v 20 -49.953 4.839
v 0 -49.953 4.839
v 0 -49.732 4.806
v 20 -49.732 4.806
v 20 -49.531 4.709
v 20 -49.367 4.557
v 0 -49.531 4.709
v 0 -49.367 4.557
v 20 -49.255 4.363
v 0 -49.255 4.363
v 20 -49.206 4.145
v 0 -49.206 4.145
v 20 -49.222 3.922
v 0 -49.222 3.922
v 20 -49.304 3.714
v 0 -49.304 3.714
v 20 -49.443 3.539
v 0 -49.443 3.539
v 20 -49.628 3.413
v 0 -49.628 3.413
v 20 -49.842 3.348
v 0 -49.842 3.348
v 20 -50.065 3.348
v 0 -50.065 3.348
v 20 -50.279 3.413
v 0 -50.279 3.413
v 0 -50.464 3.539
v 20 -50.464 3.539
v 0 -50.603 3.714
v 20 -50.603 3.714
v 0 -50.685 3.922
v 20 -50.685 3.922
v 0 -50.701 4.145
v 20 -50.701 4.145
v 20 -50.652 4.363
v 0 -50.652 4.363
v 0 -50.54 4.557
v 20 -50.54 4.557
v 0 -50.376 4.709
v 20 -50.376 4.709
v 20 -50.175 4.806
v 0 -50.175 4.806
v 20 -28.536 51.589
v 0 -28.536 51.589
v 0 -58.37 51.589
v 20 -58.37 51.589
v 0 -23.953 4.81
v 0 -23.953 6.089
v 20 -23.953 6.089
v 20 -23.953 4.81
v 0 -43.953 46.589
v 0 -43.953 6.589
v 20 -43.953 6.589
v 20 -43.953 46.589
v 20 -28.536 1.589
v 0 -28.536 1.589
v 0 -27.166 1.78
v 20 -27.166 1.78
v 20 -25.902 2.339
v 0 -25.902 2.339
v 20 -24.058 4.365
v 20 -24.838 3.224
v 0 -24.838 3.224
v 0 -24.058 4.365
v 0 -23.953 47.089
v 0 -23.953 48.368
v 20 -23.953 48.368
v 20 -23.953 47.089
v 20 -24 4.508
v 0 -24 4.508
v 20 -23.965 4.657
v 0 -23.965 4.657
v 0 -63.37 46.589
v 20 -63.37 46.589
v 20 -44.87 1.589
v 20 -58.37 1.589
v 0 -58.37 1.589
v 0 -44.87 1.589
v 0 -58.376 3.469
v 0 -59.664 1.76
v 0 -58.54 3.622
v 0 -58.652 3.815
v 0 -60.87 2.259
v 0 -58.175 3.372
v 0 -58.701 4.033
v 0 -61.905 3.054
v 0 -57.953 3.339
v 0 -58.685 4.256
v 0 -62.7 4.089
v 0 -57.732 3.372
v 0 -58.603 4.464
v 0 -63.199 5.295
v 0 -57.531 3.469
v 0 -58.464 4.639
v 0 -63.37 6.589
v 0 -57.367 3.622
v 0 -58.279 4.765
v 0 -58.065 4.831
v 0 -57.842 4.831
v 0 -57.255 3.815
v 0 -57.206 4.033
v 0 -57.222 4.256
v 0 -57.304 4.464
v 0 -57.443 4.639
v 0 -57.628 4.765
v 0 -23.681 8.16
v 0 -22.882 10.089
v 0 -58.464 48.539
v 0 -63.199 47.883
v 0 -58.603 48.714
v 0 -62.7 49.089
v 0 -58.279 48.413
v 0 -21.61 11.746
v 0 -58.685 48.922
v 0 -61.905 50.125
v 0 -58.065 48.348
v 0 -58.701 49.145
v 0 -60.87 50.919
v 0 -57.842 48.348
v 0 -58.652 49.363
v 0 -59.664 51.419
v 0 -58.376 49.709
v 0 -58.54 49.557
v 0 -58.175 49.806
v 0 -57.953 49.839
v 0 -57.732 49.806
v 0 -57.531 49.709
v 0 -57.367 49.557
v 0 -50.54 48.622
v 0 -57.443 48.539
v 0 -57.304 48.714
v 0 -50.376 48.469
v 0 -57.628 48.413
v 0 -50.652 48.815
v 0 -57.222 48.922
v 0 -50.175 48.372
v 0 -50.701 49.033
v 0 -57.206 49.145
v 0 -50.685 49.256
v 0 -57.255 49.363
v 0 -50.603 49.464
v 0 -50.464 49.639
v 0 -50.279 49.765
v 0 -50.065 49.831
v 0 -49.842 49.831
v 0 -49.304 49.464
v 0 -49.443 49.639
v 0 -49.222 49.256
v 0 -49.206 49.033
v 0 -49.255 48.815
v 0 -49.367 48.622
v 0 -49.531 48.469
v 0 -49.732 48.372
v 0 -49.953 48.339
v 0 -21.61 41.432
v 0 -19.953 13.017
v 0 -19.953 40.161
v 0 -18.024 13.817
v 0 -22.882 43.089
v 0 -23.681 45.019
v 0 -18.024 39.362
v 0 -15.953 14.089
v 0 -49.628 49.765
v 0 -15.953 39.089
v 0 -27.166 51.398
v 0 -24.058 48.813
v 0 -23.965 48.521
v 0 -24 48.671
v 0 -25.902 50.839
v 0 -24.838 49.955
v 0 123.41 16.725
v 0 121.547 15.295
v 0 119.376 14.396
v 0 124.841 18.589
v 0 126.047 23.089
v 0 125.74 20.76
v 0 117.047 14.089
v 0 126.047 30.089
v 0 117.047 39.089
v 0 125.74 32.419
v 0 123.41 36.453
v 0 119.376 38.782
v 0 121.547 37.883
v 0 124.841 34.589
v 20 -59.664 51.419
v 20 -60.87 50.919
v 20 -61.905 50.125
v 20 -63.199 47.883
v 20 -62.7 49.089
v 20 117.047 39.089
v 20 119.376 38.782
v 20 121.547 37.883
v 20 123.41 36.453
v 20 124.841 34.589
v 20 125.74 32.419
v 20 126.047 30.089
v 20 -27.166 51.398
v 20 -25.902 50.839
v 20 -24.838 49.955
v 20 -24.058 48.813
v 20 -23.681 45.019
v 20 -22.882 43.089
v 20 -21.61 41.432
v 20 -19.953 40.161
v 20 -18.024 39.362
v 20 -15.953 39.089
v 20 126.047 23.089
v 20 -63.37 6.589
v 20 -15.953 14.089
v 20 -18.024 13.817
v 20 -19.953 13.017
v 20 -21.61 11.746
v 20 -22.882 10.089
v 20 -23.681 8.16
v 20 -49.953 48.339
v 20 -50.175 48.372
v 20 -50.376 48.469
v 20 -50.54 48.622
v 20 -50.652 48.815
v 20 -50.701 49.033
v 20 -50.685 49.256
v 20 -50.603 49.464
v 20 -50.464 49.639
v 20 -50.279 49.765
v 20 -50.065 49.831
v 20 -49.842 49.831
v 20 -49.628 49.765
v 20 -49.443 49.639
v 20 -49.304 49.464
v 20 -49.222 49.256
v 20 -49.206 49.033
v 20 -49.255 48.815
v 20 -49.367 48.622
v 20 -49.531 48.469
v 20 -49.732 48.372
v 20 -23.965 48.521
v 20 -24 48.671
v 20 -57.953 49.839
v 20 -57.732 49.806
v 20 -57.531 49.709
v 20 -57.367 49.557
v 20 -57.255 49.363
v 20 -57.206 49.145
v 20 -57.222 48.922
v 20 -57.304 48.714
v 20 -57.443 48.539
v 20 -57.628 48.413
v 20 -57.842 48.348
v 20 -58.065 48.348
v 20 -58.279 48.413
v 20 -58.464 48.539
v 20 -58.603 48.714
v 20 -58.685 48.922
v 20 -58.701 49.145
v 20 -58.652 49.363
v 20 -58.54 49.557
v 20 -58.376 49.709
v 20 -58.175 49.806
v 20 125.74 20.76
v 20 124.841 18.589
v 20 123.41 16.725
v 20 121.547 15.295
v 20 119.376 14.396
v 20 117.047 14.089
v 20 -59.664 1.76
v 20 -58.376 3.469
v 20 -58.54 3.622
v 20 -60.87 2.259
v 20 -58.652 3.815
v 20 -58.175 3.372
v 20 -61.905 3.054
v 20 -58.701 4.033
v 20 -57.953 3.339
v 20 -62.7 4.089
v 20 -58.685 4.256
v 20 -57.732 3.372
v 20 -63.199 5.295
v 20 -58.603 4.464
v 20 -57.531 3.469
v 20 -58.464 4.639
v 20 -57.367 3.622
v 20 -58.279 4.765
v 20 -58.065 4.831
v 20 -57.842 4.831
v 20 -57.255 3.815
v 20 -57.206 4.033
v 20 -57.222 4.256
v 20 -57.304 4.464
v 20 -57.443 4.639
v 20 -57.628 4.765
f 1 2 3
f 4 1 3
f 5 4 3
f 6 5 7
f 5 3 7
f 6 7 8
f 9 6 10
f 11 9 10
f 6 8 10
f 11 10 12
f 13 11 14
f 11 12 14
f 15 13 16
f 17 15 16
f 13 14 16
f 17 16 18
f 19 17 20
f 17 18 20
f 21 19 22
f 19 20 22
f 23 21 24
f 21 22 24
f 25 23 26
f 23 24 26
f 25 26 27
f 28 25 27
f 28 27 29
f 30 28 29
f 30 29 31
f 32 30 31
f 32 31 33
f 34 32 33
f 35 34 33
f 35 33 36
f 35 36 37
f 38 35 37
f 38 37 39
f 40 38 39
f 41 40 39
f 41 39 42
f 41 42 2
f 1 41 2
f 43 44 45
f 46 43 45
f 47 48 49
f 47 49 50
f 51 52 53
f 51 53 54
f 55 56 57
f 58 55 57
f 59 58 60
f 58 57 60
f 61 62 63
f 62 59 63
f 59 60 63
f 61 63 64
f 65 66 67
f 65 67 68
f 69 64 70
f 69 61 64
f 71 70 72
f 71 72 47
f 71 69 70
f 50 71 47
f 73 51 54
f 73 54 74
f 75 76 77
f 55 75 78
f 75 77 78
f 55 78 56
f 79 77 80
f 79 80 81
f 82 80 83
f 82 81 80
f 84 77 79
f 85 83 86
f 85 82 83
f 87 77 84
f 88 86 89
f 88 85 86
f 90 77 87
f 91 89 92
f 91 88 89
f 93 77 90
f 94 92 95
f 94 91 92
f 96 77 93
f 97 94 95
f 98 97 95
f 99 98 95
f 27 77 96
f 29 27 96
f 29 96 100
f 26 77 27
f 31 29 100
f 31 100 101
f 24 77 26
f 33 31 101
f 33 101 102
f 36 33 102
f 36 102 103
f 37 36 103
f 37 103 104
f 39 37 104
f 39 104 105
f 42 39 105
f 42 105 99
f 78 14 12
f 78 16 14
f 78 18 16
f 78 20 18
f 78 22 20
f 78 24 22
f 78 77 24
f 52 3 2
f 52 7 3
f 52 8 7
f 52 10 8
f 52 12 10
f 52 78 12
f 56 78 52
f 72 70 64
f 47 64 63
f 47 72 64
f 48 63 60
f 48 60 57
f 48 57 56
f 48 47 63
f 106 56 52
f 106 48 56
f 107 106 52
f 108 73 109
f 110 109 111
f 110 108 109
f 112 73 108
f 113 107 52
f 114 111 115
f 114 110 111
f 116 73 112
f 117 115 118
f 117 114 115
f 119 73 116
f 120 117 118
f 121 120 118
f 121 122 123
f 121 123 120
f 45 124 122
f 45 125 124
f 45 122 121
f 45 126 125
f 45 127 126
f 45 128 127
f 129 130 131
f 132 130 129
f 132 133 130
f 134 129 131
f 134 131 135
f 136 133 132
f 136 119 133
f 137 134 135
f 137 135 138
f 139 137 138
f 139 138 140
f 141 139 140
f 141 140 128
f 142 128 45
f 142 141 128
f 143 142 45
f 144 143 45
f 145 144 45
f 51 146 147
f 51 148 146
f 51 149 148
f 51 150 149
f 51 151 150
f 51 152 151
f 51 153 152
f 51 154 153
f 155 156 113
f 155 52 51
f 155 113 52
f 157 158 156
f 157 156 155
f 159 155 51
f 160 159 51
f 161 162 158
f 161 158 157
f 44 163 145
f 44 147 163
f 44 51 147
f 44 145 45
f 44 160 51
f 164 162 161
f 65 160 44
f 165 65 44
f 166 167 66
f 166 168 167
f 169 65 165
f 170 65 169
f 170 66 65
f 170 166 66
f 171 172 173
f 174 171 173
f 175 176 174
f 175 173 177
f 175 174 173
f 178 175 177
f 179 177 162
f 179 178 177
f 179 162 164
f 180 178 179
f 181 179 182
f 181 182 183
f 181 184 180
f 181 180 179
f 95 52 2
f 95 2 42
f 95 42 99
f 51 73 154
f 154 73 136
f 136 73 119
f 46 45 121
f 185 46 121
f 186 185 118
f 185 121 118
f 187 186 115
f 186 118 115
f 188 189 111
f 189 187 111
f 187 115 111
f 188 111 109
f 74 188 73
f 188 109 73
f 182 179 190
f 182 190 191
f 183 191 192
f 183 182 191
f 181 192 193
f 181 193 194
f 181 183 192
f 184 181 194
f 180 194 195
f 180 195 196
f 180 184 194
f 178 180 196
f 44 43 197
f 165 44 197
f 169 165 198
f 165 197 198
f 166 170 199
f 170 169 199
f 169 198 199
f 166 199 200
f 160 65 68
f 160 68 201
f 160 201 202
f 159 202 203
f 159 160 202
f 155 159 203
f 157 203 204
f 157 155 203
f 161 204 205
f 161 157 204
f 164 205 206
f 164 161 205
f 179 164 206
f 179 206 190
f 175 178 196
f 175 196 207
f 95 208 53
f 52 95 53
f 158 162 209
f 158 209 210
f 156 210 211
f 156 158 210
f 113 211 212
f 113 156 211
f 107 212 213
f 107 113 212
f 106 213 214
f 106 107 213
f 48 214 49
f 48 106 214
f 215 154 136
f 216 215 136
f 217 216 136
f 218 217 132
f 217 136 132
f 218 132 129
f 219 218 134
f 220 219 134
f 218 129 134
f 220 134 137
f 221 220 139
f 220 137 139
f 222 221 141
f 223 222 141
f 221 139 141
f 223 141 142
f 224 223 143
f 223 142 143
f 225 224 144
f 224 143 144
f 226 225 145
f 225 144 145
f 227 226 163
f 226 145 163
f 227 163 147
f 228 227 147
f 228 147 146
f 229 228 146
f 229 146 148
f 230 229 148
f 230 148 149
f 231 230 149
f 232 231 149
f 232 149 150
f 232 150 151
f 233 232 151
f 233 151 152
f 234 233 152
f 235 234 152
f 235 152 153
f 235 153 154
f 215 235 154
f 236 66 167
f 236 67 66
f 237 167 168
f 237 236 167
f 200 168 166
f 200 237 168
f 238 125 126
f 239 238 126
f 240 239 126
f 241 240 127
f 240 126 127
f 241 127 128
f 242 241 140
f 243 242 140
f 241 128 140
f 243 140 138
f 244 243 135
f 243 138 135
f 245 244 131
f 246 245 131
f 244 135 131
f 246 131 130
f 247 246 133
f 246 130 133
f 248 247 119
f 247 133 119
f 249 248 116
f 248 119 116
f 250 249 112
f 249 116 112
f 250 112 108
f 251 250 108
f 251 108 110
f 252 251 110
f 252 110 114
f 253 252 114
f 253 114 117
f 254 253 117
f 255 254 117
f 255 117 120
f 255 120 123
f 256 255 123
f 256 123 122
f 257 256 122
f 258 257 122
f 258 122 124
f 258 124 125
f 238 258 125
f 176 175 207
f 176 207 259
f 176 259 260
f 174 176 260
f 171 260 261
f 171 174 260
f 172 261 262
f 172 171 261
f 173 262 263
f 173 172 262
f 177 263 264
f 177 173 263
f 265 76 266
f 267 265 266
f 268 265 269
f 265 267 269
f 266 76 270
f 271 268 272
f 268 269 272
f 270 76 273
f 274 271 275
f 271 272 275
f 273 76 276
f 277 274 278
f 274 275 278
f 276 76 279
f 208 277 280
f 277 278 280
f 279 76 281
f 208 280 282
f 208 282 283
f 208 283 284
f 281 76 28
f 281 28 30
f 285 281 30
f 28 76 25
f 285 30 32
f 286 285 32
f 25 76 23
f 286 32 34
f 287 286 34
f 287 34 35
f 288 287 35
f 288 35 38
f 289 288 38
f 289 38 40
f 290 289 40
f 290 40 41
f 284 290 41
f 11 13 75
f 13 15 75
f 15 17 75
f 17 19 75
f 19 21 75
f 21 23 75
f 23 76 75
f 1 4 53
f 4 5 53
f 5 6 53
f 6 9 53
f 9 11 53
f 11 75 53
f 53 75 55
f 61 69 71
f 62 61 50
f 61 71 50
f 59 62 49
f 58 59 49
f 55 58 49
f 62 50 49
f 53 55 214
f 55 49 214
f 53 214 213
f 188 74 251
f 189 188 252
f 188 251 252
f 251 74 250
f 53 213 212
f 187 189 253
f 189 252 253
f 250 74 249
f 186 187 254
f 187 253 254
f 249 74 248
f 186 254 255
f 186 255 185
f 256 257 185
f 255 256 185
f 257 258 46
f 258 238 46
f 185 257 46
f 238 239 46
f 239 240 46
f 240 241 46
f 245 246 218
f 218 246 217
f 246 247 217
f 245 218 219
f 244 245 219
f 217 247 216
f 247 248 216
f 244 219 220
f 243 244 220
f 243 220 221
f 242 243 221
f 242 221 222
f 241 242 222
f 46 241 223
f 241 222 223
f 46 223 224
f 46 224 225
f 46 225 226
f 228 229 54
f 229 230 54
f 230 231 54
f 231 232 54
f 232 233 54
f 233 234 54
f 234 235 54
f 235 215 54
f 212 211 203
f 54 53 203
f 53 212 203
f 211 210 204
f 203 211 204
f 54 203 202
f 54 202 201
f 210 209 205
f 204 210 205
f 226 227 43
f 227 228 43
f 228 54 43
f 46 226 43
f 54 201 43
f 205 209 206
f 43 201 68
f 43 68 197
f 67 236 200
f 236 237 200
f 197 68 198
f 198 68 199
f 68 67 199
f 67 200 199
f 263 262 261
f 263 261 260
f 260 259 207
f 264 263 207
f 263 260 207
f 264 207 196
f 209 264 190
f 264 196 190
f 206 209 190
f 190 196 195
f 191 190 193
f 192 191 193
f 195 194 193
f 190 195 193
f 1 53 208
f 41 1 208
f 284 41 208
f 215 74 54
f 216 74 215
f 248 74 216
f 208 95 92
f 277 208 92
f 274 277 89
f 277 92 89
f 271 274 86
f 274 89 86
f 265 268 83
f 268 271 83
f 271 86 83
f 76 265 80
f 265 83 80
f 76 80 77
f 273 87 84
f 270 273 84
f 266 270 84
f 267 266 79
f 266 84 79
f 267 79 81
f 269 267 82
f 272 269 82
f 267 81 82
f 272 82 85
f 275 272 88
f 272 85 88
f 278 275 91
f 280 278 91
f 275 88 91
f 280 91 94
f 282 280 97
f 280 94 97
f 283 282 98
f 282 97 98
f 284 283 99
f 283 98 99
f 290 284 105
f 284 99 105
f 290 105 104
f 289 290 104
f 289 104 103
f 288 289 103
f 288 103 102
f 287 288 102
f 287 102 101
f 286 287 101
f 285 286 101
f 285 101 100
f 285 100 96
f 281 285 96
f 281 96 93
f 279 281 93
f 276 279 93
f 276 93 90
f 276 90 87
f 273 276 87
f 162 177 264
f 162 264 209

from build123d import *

# Parameters (mm, degrees)
BOSS_EXTRUDE1_DEPTH = 20
SKETCH2_R           = 0.75
CUT_EXTRUDE1_DEPTH  = 140.606785953
CUT_EXTRUDE2_DEPTH  = 140.606785953
FILLET1_R           = 5
FILLET2_R           = 1
FILLET3_R           = 5
FILLET4_R           = 1
SKETCH4_W           = 19.881917645
SKETCH4_H           = 22.757656903
CUT_EXTRUDE3_DEPTH  = 140.606786098
FILLET5_R           = 5
FILLET6_R           = 1
FILLET7_R           = 5
FILLET8_R           = 1


# Some blends are built 0.0001 mm under size
with BuildPart() as part:
    # Sketch1 → Boss-Extrude1 (new body)
    with BuildSketch(Plane(origin=(0, 0, 0), x_dir=(0, 0, -1), z_dir=(1, 0, 0))):
        with BuildLine():
            Line((-39.089147287, -15.953488372), (-39.089147287, 117.046511628))
            ThreePointArc((-39.089147287, 117.046511628), (-36.453108318, 123.410472659), (-30.089147287, 126.046511628))
            Line((-30.089147287, 126.046511628), (-23.089147287, 126.046511628))
            ThreePointArc((-23.089147287, 126.046511628), (-16.725186256, 123.410472659), (-14.089147287, 117.046511628))
            Line((-14.089147287, 117.046511628), (-14.089147287, -15.953488372))
            ThreePointArc((-14.089147287, -15.953488372), (-11.746001536, -21.610342622), (-6.089147287, -23.953488372))
            Line((-6.089147287, -23.953488372), (-4.589147287, -23.953488372))
            ThreePointArc((-4.589147287, -23.953488372), (1.067706963, -26.296634123), (3.410852713, -31.953488372))
            Line((3.410852713, -31.953488372), (3.410852713, -55.953488372))
            ThreePointArc((3.410852713, -55.953488372), (1.067706963, -61.610342622), (-4.589147287, -63.953488372))
            Line((-4.589147287, -63.953488372), (-6.589147287, -63.953488372))
            Line((-6.589147287, -63.953488372), (-6.589147287, -43.953488372))
            Line((-6.589147287, -43.953488372), (-46.589147287, -43.953488372))
            Line((-46.589147287, -43.953488372), (-46.589147287, -63.953488372))
            Line((-46.589147287, -63.953488372), (-48.589147287, -63.953488372))
            ThreePointArc((-48.589147287, -63.953488372), (-54.246001536, -61.610342622), (-56.589147287, -55.953488372))
            Line((-56.589147287, -55.953488372), (-56.589147287, -31.953488372))
            ThreePointArc((-56.589147287, -31.953488372), (-54.246001536, -26.296634123), (-48.589147287, -23.953488372))
            Line((-48.589147287, -23.953488372), (-47.089147287, -23.953488372))
            ThreePointArc((-47.089147287, -23.953488372), (-41.432293037, -21.610342622), (-39.089147287, -15.953488372))
        make_face()
    extrude(amount=BOSS_EXTRUDE1_DEPTH)

    # Sketch2 → Cut-Extrude1 (cut, through all)
    with BuildSketch(Plane.ZY):
        with Locations((4.089147287, -49.953488372)):
            Circle(SKETCH2_R)
        with Locations(Location((4.089147287, -57.953488372, 0), (0, 0, 180))):
            Circle(SKETCH2_R)
        with Locations((49.089147287, -57.953488372)):
            Circle(SKETCH2_R)
        with Locations(Location((49.089147287, -49.953488372, 0), (0, 0, 180))):
            Circle(SKETCH2_R)
    extrude(amount=-CUT_EXTRUDE1_DEPTH, mode=Mode.SUBTRACT)

    # Sketch3 → Cut-Extrude2 (cut, through all)
    with BuildSketch(Plane.ZY):
        with BuildLine():
            Line((1.589147287, -43.953488372), (-3.410852713, -43.953488372))
            Line((-3.410852713, -43.953488372), (-12.995571428, -43.953488372))
            Line((-12.995571428, -43.953488372), (-12.995571428, -71.298292192))
            Line((-12.995571428, -71.298292192), (6.589147287, -71.298292192))
            Line((6.589147287, -71.298292192), (6.589147287, -63.369686859))
            ThreePointArc((6.589147287, -63.369686859), (3.053613381, -61.905220765), (1.589147287, -58.369686859))
            Line((1.589147287, -58.369686859), (1.589147287, -43.953488372))
        make_face()
        with BuildLine():
            Line((46.589147287, -63.369686859), (46.589147287, -71.298292192))
            Line((46.589147287, -71.298292192), (65.185710821, -71.298292192))
            Line((65.185710821, -71.298292192), (65.185710821, -43.953488372))
            Line((65.185710821, -43.953488372), (56.589147287, -43.953488372))
            Line((56.589147287, -43.953488372), (51.589147287, -43.953488372))
            Line((51.589147287, -43.953488372), (51.589147287, -58.369686859))
            ThreePointArc((51.589147287, -58.369686859), (50.124681193, -61.905220765), (46.589147287, -63.369686859))
        make_face()
    extrude(amount=-CUT_EXTRUDE2_DEPTH, mode=Mode.SUBTRACT)

    # Fillet1
    fillet1_edges = [part.edges().sort_by_distance(p)[0] for p in [
        (10, -43.953488372, -3.410852713),
    ]]
    fillet(fillet1_edges, radius=FILLET1_R - 0.0001)  # a hair under: the kernel refuses the full size

    # Fillet2
    fillet2_edges = [part.edges().sort_by_distance(p)[0] for p in [
        (10, -43.953488372, 1.589147287),
    ]]
    fillet(fillet2_edges, radius=FILLET2_R)

    # Fillet3
    fillet3_edges = [part.edges().sort_by_distance(p)[0] for p in [
        (10, -43.953488372, 56.589147287),
    ]]
    fillet(fillet3_edges, radius=FILLET3_R - 0.0001)  # a hair under: the kernel refuses the full size

    # Fillet4
    fillet4_edges = [part.edges().sort_by_distance(p)[0] for p in [
        (10, -43.953488372, 51.589147287),
    ]]
    fillet(fillet4_edges, radius=FILLET4_R)

    # Sketch4 → Cut-Extrude3 (cut, through all)
    with BuildSketch(Plane.ZY):
        with Locations((-8.351811536, -35.916118337)):
            Rectangle(SKETCH4_W, SKETCH4_H)
        Polygon((51.589147287, -47.294946788), (51.589147287, -22.319102336), (73.994526012, -22.319102336), (73.994526012, -45.973763973), align=None)
    extrude(amount=-CUT_EXTRUDE3_DEPTH, mode=Mode.SUBTRACT)

    # Fillet5
    # the kernel refuses this fillet: 5 mm, written as the material it takes off along each edge
    with BuildSketch(Plane(origin=(-9.996935455, -24.537289885, 1.589147287), x_dir=(0, -1, 0), z_dir=(1, 0, 0))) as fillet5_piece_1:
        with BuildLine():
            CenterArc((3.998774182, -5), FILLET5_R, 90, 66.421821522)
            ThreePointArc((-0.583801513, -3), (-0.436494933, -1.4718619), (0, 0))
            Line((0, 0), (3.998774182, 0))
        make_face()
    extrude(amount=39.99387091, mode=Mode.SUBTRACT)

    # Fillet6
    fillet6_edges = [part.edges().sort_by_distance(p)[0] for p in [
        (10, -23.953488372, 4.589147287),
    ]]
    fillet(fillet6_edges, radius=FILLET6_R)

    # Fillet7
    # the kernel refuses this fillet: 5 mm, written as the material it takes off along each edge
    with BuildSketch(Plane(origin=(29.996935455, -24.537289885, 51.589147287), x_dir=(0, -1, 0), z_dir=(-1, 0, 0))) as fillet7_piece_1:
        with BuildLine():
            CenterArc((3.998774182, -5), FILLET7_R, 90, 66.421821522)
            ThreePointArc((-0.583801513, -3), (-0.436494933, -1.4718619), (0, 0))
            Line((0, 0), (3.998774182, 0))
        make_face()
    extrude(amount=39.99387091, mode=Mode.SUBTRACT)

    # Fillet8
    fillet8_edges = [part.edges().sort_by_distance(p)[0] for p in [
        (10, -23.953488372, 48.589147287),
    ]]
    fillet(fillet8_edges, radius=FILLET8_R)


solid = part.part
